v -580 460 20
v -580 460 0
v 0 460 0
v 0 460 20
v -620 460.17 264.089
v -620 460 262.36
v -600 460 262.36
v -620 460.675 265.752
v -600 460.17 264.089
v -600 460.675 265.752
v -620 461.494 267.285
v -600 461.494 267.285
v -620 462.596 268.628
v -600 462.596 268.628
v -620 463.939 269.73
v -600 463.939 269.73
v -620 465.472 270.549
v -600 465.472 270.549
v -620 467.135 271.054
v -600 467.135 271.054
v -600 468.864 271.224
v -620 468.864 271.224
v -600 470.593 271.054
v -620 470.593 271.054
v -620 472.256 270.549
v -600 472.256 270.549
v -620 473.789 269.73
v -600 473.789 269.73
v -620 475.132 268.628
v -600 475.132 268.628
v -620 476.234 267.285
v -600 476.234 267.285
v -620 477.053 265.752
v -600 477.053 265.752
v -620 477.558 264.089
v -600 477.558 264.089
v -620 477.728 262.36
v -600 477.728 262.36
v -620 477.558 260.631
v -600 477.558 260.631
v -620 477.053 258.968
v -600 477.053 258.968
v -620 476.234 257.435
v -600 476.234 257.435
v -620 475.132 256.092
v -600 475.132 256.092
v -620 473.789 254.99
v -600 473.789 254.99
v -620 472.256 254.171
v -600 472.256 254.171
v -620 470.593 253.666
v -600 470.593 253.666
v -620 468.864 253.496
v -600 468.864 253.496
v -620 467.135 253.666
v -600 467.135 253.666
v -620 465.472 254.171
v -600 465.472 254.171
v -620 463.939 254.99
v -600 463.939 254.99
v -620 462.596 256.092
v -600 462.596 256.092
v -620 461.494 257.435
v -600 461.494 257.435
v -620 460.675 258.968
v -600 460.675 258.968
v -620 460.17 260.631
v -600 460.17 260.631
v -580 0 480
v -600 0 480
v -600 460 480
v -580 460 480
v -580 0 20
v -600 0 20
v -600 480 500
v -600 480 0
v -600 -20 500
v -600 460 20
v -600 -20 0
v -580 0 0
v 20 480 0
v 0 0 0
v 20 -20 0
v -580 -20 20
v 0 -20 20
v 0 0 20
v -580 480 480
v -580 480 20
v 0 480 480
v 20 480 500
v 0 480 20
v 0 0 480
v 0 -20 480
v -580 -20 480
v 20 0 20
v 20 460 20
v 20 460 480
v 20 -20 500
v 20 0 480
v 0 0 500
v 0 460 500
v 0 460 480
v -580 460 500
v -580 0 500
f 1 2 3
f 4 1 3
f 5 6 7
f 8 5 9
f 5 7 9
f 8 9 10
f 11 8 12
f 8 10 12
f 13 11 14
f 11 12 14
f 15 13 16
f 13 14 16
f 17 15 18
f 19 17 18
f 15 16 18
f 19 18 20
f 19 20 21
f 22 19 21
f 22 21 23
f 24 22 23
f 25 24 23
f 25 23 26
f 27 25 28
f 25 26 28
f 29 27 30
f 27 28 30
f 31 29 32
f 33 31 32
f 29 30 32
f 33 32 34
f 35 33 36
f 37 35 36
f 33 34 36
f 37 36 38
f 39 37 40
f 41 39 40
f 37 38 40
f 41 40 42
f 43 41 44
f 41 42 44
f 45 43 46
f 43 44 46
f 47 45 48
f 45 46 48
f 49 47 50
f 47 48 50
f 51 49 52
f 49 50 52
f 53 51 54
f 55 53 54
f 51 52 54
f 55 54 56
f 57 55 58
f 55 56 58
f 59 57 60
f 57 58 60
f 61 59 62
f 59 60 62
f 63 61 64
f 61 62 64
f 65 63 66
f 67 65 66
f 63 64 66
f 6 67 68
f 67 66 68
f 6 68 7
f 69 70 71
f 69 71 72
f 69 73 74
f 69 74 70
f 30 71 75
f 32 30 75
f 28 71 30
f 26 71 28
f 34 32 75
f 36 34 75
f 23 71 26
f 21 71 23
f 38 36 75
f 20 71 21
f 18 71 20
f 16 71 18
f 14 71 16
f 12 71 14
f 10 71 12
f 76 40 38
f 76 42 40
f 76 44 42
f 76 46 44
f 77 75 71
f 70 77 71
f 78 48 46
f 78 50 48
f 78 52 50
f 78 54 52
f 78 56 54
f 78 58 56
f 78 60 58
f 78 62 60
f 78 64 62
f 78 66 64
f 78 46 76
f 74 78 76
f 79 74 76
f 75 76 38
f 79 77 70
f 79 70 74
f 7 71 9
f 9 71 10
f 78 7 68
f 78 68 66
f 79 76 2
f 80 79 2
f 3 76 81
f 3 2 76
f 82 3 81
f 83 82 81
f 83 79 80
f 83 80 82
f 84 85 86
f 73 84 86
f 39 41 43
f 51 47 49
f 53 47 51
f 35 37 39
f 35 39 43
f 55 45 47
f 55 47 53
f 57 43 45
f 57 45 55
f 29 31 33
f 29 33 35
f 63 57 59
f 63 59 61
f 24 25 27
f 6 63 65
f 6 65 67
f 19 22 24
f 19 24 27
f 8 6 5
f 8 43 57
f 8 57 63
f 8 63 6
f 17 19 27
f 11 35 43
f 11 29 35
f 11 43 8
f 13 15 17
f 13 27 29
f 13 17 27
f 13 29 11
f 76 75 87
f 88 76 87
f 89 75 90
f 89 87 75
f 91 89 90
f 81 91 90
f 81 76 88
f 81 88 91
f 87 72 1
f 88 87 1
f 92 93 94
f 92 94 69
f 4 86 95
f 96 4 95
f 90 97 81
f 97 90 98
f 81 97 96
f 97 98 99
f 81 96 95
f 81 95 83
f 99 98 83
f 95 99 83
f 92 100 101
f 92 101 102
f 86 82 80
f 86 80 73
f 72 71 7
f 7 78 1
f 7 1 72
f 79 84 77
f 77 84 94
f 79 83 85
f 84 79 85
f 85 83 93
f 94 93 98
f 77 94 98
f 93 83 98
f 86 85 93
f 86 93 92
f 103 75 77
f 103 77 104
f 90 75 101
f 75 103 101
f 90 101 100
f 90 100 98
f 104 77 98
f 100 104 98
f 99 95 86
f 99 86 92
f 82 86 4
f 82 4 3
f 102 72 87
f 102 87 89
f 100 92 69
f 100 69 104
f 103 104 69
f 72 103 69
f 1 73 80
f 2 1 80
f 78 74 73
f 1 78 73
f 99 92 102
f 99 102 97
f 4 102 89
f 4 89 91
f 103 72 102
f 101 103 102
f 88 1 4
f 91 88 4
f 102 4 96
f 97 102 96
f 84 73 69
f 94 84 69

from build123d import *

# Parameters (mm, degrees)
SKETCH_1_W      = 20
SKETCH_1_H      = 20
EXTRUDE_1_DEPTH = 500
SKETCH_2_W      = 20
SKETCH_2_H      = 20
EXTRUDE_2_DEPTH = 580
SKETCH_3_W      = 500
SKETCH_3_H      = 20
EXTRUDE_3_DEPTH = 20
SKETCH_4_W      = 20
SKETCH_4_H      = 20
EXTRUDE_4_DEPTH = 460
SKETCH_5_W      = 620
SKETCH_5_H      = 500
SKETCH_5_W_2    = 580
SKETCH_5_H_2    = 460
EXTRUDE_5_DEPTH = 20
SKETCH_6_R      = 8.86405517
EXTRUDE_6_DEPTH = 20


with BuildPart() as part:
    # 草图1 → 凸台-拉伸1 (new body)
    with BuildSketch(Plane.XY):
        with Locations((10, -10)):
            Rectangle(SKETCH_1_W, SKETCH_1_H)
    extrude(amount=EXTRUDE_1_DEPTH)

    # 草图2 → 凸台-拉伸2 (add)
    with BuildSketch(Plane.ZY):
        with Locations((490, -10)):
            Rectangle(SKETCH_2_W, SKETCH_2_H)
        with Locations((10, -10)):
            Rectangle(SKETCH_2_W, SKETCH_2_H)
    extrude(amount=EXTRUDE_2_DEPTH)

    # 草图3 → 凸台-拉伸3 (add)
    with BuildSketch(Plane.ZY.offset(580)):
        with Locations((250, -10)):
            Rectangle(SKETCH_3_W, SKETCH_3_H)
    extrude(amount=EXTRUDE_3_DEPTH)

    # 草图4 → 凸台-拉伸4 (add)
    with BuildSketch(Plane(origin=(0, 0, 0), x_dir=(1, 0, 0), z_dir=(0, 1, 0))):
        with Locations((10, -10)):
            Rectangle(SKETCH_4_W, SKETCH_4_H)
        with Locations((10, -490)):
            Rectangle(SKETCH_4_W, SKETCH_4_H)
        with Locations((-590, -490)):
            Rectangle(SKETCH_4_W, SKETCH_4_H)
        with Locations((-590, -10)):
            Rectangle(SKETCH_4_W, SKETCH_4_H)
    extrude(amount=EXTRUDE_4_DEPTH)

    # 草图5 → 凸台-拉伸5 (add)
    with BuildSketch(Plane(origin=(0, 460, 0), x_dir=(1, 0, 0), z_dir=(0, 1, 0))):
        with Locations((-290, -250)):
            Rectangle(SKETCH_5_W, SKETCH_5_H)
        with Locations((-290, -250)):
            Rectangle(SKETCH_5_W_2, SKETCH_5_H_2, mode=Mode.SUBTRACT)
    extrude(amount=EXTRUDE_5_DEPTH)

    # 草图6 → 凸台-拉伸6 (add)
    with BuildSketch(Plane.ZY.offset(600)):
        with Locations(Location((262.359920907, 468.86405517, 0), (0, 0, 270))):
            Circle(SKETCH_6_R)
    extrude(amount=EXTRUDE_6_DEPTH)


solid = part.part
